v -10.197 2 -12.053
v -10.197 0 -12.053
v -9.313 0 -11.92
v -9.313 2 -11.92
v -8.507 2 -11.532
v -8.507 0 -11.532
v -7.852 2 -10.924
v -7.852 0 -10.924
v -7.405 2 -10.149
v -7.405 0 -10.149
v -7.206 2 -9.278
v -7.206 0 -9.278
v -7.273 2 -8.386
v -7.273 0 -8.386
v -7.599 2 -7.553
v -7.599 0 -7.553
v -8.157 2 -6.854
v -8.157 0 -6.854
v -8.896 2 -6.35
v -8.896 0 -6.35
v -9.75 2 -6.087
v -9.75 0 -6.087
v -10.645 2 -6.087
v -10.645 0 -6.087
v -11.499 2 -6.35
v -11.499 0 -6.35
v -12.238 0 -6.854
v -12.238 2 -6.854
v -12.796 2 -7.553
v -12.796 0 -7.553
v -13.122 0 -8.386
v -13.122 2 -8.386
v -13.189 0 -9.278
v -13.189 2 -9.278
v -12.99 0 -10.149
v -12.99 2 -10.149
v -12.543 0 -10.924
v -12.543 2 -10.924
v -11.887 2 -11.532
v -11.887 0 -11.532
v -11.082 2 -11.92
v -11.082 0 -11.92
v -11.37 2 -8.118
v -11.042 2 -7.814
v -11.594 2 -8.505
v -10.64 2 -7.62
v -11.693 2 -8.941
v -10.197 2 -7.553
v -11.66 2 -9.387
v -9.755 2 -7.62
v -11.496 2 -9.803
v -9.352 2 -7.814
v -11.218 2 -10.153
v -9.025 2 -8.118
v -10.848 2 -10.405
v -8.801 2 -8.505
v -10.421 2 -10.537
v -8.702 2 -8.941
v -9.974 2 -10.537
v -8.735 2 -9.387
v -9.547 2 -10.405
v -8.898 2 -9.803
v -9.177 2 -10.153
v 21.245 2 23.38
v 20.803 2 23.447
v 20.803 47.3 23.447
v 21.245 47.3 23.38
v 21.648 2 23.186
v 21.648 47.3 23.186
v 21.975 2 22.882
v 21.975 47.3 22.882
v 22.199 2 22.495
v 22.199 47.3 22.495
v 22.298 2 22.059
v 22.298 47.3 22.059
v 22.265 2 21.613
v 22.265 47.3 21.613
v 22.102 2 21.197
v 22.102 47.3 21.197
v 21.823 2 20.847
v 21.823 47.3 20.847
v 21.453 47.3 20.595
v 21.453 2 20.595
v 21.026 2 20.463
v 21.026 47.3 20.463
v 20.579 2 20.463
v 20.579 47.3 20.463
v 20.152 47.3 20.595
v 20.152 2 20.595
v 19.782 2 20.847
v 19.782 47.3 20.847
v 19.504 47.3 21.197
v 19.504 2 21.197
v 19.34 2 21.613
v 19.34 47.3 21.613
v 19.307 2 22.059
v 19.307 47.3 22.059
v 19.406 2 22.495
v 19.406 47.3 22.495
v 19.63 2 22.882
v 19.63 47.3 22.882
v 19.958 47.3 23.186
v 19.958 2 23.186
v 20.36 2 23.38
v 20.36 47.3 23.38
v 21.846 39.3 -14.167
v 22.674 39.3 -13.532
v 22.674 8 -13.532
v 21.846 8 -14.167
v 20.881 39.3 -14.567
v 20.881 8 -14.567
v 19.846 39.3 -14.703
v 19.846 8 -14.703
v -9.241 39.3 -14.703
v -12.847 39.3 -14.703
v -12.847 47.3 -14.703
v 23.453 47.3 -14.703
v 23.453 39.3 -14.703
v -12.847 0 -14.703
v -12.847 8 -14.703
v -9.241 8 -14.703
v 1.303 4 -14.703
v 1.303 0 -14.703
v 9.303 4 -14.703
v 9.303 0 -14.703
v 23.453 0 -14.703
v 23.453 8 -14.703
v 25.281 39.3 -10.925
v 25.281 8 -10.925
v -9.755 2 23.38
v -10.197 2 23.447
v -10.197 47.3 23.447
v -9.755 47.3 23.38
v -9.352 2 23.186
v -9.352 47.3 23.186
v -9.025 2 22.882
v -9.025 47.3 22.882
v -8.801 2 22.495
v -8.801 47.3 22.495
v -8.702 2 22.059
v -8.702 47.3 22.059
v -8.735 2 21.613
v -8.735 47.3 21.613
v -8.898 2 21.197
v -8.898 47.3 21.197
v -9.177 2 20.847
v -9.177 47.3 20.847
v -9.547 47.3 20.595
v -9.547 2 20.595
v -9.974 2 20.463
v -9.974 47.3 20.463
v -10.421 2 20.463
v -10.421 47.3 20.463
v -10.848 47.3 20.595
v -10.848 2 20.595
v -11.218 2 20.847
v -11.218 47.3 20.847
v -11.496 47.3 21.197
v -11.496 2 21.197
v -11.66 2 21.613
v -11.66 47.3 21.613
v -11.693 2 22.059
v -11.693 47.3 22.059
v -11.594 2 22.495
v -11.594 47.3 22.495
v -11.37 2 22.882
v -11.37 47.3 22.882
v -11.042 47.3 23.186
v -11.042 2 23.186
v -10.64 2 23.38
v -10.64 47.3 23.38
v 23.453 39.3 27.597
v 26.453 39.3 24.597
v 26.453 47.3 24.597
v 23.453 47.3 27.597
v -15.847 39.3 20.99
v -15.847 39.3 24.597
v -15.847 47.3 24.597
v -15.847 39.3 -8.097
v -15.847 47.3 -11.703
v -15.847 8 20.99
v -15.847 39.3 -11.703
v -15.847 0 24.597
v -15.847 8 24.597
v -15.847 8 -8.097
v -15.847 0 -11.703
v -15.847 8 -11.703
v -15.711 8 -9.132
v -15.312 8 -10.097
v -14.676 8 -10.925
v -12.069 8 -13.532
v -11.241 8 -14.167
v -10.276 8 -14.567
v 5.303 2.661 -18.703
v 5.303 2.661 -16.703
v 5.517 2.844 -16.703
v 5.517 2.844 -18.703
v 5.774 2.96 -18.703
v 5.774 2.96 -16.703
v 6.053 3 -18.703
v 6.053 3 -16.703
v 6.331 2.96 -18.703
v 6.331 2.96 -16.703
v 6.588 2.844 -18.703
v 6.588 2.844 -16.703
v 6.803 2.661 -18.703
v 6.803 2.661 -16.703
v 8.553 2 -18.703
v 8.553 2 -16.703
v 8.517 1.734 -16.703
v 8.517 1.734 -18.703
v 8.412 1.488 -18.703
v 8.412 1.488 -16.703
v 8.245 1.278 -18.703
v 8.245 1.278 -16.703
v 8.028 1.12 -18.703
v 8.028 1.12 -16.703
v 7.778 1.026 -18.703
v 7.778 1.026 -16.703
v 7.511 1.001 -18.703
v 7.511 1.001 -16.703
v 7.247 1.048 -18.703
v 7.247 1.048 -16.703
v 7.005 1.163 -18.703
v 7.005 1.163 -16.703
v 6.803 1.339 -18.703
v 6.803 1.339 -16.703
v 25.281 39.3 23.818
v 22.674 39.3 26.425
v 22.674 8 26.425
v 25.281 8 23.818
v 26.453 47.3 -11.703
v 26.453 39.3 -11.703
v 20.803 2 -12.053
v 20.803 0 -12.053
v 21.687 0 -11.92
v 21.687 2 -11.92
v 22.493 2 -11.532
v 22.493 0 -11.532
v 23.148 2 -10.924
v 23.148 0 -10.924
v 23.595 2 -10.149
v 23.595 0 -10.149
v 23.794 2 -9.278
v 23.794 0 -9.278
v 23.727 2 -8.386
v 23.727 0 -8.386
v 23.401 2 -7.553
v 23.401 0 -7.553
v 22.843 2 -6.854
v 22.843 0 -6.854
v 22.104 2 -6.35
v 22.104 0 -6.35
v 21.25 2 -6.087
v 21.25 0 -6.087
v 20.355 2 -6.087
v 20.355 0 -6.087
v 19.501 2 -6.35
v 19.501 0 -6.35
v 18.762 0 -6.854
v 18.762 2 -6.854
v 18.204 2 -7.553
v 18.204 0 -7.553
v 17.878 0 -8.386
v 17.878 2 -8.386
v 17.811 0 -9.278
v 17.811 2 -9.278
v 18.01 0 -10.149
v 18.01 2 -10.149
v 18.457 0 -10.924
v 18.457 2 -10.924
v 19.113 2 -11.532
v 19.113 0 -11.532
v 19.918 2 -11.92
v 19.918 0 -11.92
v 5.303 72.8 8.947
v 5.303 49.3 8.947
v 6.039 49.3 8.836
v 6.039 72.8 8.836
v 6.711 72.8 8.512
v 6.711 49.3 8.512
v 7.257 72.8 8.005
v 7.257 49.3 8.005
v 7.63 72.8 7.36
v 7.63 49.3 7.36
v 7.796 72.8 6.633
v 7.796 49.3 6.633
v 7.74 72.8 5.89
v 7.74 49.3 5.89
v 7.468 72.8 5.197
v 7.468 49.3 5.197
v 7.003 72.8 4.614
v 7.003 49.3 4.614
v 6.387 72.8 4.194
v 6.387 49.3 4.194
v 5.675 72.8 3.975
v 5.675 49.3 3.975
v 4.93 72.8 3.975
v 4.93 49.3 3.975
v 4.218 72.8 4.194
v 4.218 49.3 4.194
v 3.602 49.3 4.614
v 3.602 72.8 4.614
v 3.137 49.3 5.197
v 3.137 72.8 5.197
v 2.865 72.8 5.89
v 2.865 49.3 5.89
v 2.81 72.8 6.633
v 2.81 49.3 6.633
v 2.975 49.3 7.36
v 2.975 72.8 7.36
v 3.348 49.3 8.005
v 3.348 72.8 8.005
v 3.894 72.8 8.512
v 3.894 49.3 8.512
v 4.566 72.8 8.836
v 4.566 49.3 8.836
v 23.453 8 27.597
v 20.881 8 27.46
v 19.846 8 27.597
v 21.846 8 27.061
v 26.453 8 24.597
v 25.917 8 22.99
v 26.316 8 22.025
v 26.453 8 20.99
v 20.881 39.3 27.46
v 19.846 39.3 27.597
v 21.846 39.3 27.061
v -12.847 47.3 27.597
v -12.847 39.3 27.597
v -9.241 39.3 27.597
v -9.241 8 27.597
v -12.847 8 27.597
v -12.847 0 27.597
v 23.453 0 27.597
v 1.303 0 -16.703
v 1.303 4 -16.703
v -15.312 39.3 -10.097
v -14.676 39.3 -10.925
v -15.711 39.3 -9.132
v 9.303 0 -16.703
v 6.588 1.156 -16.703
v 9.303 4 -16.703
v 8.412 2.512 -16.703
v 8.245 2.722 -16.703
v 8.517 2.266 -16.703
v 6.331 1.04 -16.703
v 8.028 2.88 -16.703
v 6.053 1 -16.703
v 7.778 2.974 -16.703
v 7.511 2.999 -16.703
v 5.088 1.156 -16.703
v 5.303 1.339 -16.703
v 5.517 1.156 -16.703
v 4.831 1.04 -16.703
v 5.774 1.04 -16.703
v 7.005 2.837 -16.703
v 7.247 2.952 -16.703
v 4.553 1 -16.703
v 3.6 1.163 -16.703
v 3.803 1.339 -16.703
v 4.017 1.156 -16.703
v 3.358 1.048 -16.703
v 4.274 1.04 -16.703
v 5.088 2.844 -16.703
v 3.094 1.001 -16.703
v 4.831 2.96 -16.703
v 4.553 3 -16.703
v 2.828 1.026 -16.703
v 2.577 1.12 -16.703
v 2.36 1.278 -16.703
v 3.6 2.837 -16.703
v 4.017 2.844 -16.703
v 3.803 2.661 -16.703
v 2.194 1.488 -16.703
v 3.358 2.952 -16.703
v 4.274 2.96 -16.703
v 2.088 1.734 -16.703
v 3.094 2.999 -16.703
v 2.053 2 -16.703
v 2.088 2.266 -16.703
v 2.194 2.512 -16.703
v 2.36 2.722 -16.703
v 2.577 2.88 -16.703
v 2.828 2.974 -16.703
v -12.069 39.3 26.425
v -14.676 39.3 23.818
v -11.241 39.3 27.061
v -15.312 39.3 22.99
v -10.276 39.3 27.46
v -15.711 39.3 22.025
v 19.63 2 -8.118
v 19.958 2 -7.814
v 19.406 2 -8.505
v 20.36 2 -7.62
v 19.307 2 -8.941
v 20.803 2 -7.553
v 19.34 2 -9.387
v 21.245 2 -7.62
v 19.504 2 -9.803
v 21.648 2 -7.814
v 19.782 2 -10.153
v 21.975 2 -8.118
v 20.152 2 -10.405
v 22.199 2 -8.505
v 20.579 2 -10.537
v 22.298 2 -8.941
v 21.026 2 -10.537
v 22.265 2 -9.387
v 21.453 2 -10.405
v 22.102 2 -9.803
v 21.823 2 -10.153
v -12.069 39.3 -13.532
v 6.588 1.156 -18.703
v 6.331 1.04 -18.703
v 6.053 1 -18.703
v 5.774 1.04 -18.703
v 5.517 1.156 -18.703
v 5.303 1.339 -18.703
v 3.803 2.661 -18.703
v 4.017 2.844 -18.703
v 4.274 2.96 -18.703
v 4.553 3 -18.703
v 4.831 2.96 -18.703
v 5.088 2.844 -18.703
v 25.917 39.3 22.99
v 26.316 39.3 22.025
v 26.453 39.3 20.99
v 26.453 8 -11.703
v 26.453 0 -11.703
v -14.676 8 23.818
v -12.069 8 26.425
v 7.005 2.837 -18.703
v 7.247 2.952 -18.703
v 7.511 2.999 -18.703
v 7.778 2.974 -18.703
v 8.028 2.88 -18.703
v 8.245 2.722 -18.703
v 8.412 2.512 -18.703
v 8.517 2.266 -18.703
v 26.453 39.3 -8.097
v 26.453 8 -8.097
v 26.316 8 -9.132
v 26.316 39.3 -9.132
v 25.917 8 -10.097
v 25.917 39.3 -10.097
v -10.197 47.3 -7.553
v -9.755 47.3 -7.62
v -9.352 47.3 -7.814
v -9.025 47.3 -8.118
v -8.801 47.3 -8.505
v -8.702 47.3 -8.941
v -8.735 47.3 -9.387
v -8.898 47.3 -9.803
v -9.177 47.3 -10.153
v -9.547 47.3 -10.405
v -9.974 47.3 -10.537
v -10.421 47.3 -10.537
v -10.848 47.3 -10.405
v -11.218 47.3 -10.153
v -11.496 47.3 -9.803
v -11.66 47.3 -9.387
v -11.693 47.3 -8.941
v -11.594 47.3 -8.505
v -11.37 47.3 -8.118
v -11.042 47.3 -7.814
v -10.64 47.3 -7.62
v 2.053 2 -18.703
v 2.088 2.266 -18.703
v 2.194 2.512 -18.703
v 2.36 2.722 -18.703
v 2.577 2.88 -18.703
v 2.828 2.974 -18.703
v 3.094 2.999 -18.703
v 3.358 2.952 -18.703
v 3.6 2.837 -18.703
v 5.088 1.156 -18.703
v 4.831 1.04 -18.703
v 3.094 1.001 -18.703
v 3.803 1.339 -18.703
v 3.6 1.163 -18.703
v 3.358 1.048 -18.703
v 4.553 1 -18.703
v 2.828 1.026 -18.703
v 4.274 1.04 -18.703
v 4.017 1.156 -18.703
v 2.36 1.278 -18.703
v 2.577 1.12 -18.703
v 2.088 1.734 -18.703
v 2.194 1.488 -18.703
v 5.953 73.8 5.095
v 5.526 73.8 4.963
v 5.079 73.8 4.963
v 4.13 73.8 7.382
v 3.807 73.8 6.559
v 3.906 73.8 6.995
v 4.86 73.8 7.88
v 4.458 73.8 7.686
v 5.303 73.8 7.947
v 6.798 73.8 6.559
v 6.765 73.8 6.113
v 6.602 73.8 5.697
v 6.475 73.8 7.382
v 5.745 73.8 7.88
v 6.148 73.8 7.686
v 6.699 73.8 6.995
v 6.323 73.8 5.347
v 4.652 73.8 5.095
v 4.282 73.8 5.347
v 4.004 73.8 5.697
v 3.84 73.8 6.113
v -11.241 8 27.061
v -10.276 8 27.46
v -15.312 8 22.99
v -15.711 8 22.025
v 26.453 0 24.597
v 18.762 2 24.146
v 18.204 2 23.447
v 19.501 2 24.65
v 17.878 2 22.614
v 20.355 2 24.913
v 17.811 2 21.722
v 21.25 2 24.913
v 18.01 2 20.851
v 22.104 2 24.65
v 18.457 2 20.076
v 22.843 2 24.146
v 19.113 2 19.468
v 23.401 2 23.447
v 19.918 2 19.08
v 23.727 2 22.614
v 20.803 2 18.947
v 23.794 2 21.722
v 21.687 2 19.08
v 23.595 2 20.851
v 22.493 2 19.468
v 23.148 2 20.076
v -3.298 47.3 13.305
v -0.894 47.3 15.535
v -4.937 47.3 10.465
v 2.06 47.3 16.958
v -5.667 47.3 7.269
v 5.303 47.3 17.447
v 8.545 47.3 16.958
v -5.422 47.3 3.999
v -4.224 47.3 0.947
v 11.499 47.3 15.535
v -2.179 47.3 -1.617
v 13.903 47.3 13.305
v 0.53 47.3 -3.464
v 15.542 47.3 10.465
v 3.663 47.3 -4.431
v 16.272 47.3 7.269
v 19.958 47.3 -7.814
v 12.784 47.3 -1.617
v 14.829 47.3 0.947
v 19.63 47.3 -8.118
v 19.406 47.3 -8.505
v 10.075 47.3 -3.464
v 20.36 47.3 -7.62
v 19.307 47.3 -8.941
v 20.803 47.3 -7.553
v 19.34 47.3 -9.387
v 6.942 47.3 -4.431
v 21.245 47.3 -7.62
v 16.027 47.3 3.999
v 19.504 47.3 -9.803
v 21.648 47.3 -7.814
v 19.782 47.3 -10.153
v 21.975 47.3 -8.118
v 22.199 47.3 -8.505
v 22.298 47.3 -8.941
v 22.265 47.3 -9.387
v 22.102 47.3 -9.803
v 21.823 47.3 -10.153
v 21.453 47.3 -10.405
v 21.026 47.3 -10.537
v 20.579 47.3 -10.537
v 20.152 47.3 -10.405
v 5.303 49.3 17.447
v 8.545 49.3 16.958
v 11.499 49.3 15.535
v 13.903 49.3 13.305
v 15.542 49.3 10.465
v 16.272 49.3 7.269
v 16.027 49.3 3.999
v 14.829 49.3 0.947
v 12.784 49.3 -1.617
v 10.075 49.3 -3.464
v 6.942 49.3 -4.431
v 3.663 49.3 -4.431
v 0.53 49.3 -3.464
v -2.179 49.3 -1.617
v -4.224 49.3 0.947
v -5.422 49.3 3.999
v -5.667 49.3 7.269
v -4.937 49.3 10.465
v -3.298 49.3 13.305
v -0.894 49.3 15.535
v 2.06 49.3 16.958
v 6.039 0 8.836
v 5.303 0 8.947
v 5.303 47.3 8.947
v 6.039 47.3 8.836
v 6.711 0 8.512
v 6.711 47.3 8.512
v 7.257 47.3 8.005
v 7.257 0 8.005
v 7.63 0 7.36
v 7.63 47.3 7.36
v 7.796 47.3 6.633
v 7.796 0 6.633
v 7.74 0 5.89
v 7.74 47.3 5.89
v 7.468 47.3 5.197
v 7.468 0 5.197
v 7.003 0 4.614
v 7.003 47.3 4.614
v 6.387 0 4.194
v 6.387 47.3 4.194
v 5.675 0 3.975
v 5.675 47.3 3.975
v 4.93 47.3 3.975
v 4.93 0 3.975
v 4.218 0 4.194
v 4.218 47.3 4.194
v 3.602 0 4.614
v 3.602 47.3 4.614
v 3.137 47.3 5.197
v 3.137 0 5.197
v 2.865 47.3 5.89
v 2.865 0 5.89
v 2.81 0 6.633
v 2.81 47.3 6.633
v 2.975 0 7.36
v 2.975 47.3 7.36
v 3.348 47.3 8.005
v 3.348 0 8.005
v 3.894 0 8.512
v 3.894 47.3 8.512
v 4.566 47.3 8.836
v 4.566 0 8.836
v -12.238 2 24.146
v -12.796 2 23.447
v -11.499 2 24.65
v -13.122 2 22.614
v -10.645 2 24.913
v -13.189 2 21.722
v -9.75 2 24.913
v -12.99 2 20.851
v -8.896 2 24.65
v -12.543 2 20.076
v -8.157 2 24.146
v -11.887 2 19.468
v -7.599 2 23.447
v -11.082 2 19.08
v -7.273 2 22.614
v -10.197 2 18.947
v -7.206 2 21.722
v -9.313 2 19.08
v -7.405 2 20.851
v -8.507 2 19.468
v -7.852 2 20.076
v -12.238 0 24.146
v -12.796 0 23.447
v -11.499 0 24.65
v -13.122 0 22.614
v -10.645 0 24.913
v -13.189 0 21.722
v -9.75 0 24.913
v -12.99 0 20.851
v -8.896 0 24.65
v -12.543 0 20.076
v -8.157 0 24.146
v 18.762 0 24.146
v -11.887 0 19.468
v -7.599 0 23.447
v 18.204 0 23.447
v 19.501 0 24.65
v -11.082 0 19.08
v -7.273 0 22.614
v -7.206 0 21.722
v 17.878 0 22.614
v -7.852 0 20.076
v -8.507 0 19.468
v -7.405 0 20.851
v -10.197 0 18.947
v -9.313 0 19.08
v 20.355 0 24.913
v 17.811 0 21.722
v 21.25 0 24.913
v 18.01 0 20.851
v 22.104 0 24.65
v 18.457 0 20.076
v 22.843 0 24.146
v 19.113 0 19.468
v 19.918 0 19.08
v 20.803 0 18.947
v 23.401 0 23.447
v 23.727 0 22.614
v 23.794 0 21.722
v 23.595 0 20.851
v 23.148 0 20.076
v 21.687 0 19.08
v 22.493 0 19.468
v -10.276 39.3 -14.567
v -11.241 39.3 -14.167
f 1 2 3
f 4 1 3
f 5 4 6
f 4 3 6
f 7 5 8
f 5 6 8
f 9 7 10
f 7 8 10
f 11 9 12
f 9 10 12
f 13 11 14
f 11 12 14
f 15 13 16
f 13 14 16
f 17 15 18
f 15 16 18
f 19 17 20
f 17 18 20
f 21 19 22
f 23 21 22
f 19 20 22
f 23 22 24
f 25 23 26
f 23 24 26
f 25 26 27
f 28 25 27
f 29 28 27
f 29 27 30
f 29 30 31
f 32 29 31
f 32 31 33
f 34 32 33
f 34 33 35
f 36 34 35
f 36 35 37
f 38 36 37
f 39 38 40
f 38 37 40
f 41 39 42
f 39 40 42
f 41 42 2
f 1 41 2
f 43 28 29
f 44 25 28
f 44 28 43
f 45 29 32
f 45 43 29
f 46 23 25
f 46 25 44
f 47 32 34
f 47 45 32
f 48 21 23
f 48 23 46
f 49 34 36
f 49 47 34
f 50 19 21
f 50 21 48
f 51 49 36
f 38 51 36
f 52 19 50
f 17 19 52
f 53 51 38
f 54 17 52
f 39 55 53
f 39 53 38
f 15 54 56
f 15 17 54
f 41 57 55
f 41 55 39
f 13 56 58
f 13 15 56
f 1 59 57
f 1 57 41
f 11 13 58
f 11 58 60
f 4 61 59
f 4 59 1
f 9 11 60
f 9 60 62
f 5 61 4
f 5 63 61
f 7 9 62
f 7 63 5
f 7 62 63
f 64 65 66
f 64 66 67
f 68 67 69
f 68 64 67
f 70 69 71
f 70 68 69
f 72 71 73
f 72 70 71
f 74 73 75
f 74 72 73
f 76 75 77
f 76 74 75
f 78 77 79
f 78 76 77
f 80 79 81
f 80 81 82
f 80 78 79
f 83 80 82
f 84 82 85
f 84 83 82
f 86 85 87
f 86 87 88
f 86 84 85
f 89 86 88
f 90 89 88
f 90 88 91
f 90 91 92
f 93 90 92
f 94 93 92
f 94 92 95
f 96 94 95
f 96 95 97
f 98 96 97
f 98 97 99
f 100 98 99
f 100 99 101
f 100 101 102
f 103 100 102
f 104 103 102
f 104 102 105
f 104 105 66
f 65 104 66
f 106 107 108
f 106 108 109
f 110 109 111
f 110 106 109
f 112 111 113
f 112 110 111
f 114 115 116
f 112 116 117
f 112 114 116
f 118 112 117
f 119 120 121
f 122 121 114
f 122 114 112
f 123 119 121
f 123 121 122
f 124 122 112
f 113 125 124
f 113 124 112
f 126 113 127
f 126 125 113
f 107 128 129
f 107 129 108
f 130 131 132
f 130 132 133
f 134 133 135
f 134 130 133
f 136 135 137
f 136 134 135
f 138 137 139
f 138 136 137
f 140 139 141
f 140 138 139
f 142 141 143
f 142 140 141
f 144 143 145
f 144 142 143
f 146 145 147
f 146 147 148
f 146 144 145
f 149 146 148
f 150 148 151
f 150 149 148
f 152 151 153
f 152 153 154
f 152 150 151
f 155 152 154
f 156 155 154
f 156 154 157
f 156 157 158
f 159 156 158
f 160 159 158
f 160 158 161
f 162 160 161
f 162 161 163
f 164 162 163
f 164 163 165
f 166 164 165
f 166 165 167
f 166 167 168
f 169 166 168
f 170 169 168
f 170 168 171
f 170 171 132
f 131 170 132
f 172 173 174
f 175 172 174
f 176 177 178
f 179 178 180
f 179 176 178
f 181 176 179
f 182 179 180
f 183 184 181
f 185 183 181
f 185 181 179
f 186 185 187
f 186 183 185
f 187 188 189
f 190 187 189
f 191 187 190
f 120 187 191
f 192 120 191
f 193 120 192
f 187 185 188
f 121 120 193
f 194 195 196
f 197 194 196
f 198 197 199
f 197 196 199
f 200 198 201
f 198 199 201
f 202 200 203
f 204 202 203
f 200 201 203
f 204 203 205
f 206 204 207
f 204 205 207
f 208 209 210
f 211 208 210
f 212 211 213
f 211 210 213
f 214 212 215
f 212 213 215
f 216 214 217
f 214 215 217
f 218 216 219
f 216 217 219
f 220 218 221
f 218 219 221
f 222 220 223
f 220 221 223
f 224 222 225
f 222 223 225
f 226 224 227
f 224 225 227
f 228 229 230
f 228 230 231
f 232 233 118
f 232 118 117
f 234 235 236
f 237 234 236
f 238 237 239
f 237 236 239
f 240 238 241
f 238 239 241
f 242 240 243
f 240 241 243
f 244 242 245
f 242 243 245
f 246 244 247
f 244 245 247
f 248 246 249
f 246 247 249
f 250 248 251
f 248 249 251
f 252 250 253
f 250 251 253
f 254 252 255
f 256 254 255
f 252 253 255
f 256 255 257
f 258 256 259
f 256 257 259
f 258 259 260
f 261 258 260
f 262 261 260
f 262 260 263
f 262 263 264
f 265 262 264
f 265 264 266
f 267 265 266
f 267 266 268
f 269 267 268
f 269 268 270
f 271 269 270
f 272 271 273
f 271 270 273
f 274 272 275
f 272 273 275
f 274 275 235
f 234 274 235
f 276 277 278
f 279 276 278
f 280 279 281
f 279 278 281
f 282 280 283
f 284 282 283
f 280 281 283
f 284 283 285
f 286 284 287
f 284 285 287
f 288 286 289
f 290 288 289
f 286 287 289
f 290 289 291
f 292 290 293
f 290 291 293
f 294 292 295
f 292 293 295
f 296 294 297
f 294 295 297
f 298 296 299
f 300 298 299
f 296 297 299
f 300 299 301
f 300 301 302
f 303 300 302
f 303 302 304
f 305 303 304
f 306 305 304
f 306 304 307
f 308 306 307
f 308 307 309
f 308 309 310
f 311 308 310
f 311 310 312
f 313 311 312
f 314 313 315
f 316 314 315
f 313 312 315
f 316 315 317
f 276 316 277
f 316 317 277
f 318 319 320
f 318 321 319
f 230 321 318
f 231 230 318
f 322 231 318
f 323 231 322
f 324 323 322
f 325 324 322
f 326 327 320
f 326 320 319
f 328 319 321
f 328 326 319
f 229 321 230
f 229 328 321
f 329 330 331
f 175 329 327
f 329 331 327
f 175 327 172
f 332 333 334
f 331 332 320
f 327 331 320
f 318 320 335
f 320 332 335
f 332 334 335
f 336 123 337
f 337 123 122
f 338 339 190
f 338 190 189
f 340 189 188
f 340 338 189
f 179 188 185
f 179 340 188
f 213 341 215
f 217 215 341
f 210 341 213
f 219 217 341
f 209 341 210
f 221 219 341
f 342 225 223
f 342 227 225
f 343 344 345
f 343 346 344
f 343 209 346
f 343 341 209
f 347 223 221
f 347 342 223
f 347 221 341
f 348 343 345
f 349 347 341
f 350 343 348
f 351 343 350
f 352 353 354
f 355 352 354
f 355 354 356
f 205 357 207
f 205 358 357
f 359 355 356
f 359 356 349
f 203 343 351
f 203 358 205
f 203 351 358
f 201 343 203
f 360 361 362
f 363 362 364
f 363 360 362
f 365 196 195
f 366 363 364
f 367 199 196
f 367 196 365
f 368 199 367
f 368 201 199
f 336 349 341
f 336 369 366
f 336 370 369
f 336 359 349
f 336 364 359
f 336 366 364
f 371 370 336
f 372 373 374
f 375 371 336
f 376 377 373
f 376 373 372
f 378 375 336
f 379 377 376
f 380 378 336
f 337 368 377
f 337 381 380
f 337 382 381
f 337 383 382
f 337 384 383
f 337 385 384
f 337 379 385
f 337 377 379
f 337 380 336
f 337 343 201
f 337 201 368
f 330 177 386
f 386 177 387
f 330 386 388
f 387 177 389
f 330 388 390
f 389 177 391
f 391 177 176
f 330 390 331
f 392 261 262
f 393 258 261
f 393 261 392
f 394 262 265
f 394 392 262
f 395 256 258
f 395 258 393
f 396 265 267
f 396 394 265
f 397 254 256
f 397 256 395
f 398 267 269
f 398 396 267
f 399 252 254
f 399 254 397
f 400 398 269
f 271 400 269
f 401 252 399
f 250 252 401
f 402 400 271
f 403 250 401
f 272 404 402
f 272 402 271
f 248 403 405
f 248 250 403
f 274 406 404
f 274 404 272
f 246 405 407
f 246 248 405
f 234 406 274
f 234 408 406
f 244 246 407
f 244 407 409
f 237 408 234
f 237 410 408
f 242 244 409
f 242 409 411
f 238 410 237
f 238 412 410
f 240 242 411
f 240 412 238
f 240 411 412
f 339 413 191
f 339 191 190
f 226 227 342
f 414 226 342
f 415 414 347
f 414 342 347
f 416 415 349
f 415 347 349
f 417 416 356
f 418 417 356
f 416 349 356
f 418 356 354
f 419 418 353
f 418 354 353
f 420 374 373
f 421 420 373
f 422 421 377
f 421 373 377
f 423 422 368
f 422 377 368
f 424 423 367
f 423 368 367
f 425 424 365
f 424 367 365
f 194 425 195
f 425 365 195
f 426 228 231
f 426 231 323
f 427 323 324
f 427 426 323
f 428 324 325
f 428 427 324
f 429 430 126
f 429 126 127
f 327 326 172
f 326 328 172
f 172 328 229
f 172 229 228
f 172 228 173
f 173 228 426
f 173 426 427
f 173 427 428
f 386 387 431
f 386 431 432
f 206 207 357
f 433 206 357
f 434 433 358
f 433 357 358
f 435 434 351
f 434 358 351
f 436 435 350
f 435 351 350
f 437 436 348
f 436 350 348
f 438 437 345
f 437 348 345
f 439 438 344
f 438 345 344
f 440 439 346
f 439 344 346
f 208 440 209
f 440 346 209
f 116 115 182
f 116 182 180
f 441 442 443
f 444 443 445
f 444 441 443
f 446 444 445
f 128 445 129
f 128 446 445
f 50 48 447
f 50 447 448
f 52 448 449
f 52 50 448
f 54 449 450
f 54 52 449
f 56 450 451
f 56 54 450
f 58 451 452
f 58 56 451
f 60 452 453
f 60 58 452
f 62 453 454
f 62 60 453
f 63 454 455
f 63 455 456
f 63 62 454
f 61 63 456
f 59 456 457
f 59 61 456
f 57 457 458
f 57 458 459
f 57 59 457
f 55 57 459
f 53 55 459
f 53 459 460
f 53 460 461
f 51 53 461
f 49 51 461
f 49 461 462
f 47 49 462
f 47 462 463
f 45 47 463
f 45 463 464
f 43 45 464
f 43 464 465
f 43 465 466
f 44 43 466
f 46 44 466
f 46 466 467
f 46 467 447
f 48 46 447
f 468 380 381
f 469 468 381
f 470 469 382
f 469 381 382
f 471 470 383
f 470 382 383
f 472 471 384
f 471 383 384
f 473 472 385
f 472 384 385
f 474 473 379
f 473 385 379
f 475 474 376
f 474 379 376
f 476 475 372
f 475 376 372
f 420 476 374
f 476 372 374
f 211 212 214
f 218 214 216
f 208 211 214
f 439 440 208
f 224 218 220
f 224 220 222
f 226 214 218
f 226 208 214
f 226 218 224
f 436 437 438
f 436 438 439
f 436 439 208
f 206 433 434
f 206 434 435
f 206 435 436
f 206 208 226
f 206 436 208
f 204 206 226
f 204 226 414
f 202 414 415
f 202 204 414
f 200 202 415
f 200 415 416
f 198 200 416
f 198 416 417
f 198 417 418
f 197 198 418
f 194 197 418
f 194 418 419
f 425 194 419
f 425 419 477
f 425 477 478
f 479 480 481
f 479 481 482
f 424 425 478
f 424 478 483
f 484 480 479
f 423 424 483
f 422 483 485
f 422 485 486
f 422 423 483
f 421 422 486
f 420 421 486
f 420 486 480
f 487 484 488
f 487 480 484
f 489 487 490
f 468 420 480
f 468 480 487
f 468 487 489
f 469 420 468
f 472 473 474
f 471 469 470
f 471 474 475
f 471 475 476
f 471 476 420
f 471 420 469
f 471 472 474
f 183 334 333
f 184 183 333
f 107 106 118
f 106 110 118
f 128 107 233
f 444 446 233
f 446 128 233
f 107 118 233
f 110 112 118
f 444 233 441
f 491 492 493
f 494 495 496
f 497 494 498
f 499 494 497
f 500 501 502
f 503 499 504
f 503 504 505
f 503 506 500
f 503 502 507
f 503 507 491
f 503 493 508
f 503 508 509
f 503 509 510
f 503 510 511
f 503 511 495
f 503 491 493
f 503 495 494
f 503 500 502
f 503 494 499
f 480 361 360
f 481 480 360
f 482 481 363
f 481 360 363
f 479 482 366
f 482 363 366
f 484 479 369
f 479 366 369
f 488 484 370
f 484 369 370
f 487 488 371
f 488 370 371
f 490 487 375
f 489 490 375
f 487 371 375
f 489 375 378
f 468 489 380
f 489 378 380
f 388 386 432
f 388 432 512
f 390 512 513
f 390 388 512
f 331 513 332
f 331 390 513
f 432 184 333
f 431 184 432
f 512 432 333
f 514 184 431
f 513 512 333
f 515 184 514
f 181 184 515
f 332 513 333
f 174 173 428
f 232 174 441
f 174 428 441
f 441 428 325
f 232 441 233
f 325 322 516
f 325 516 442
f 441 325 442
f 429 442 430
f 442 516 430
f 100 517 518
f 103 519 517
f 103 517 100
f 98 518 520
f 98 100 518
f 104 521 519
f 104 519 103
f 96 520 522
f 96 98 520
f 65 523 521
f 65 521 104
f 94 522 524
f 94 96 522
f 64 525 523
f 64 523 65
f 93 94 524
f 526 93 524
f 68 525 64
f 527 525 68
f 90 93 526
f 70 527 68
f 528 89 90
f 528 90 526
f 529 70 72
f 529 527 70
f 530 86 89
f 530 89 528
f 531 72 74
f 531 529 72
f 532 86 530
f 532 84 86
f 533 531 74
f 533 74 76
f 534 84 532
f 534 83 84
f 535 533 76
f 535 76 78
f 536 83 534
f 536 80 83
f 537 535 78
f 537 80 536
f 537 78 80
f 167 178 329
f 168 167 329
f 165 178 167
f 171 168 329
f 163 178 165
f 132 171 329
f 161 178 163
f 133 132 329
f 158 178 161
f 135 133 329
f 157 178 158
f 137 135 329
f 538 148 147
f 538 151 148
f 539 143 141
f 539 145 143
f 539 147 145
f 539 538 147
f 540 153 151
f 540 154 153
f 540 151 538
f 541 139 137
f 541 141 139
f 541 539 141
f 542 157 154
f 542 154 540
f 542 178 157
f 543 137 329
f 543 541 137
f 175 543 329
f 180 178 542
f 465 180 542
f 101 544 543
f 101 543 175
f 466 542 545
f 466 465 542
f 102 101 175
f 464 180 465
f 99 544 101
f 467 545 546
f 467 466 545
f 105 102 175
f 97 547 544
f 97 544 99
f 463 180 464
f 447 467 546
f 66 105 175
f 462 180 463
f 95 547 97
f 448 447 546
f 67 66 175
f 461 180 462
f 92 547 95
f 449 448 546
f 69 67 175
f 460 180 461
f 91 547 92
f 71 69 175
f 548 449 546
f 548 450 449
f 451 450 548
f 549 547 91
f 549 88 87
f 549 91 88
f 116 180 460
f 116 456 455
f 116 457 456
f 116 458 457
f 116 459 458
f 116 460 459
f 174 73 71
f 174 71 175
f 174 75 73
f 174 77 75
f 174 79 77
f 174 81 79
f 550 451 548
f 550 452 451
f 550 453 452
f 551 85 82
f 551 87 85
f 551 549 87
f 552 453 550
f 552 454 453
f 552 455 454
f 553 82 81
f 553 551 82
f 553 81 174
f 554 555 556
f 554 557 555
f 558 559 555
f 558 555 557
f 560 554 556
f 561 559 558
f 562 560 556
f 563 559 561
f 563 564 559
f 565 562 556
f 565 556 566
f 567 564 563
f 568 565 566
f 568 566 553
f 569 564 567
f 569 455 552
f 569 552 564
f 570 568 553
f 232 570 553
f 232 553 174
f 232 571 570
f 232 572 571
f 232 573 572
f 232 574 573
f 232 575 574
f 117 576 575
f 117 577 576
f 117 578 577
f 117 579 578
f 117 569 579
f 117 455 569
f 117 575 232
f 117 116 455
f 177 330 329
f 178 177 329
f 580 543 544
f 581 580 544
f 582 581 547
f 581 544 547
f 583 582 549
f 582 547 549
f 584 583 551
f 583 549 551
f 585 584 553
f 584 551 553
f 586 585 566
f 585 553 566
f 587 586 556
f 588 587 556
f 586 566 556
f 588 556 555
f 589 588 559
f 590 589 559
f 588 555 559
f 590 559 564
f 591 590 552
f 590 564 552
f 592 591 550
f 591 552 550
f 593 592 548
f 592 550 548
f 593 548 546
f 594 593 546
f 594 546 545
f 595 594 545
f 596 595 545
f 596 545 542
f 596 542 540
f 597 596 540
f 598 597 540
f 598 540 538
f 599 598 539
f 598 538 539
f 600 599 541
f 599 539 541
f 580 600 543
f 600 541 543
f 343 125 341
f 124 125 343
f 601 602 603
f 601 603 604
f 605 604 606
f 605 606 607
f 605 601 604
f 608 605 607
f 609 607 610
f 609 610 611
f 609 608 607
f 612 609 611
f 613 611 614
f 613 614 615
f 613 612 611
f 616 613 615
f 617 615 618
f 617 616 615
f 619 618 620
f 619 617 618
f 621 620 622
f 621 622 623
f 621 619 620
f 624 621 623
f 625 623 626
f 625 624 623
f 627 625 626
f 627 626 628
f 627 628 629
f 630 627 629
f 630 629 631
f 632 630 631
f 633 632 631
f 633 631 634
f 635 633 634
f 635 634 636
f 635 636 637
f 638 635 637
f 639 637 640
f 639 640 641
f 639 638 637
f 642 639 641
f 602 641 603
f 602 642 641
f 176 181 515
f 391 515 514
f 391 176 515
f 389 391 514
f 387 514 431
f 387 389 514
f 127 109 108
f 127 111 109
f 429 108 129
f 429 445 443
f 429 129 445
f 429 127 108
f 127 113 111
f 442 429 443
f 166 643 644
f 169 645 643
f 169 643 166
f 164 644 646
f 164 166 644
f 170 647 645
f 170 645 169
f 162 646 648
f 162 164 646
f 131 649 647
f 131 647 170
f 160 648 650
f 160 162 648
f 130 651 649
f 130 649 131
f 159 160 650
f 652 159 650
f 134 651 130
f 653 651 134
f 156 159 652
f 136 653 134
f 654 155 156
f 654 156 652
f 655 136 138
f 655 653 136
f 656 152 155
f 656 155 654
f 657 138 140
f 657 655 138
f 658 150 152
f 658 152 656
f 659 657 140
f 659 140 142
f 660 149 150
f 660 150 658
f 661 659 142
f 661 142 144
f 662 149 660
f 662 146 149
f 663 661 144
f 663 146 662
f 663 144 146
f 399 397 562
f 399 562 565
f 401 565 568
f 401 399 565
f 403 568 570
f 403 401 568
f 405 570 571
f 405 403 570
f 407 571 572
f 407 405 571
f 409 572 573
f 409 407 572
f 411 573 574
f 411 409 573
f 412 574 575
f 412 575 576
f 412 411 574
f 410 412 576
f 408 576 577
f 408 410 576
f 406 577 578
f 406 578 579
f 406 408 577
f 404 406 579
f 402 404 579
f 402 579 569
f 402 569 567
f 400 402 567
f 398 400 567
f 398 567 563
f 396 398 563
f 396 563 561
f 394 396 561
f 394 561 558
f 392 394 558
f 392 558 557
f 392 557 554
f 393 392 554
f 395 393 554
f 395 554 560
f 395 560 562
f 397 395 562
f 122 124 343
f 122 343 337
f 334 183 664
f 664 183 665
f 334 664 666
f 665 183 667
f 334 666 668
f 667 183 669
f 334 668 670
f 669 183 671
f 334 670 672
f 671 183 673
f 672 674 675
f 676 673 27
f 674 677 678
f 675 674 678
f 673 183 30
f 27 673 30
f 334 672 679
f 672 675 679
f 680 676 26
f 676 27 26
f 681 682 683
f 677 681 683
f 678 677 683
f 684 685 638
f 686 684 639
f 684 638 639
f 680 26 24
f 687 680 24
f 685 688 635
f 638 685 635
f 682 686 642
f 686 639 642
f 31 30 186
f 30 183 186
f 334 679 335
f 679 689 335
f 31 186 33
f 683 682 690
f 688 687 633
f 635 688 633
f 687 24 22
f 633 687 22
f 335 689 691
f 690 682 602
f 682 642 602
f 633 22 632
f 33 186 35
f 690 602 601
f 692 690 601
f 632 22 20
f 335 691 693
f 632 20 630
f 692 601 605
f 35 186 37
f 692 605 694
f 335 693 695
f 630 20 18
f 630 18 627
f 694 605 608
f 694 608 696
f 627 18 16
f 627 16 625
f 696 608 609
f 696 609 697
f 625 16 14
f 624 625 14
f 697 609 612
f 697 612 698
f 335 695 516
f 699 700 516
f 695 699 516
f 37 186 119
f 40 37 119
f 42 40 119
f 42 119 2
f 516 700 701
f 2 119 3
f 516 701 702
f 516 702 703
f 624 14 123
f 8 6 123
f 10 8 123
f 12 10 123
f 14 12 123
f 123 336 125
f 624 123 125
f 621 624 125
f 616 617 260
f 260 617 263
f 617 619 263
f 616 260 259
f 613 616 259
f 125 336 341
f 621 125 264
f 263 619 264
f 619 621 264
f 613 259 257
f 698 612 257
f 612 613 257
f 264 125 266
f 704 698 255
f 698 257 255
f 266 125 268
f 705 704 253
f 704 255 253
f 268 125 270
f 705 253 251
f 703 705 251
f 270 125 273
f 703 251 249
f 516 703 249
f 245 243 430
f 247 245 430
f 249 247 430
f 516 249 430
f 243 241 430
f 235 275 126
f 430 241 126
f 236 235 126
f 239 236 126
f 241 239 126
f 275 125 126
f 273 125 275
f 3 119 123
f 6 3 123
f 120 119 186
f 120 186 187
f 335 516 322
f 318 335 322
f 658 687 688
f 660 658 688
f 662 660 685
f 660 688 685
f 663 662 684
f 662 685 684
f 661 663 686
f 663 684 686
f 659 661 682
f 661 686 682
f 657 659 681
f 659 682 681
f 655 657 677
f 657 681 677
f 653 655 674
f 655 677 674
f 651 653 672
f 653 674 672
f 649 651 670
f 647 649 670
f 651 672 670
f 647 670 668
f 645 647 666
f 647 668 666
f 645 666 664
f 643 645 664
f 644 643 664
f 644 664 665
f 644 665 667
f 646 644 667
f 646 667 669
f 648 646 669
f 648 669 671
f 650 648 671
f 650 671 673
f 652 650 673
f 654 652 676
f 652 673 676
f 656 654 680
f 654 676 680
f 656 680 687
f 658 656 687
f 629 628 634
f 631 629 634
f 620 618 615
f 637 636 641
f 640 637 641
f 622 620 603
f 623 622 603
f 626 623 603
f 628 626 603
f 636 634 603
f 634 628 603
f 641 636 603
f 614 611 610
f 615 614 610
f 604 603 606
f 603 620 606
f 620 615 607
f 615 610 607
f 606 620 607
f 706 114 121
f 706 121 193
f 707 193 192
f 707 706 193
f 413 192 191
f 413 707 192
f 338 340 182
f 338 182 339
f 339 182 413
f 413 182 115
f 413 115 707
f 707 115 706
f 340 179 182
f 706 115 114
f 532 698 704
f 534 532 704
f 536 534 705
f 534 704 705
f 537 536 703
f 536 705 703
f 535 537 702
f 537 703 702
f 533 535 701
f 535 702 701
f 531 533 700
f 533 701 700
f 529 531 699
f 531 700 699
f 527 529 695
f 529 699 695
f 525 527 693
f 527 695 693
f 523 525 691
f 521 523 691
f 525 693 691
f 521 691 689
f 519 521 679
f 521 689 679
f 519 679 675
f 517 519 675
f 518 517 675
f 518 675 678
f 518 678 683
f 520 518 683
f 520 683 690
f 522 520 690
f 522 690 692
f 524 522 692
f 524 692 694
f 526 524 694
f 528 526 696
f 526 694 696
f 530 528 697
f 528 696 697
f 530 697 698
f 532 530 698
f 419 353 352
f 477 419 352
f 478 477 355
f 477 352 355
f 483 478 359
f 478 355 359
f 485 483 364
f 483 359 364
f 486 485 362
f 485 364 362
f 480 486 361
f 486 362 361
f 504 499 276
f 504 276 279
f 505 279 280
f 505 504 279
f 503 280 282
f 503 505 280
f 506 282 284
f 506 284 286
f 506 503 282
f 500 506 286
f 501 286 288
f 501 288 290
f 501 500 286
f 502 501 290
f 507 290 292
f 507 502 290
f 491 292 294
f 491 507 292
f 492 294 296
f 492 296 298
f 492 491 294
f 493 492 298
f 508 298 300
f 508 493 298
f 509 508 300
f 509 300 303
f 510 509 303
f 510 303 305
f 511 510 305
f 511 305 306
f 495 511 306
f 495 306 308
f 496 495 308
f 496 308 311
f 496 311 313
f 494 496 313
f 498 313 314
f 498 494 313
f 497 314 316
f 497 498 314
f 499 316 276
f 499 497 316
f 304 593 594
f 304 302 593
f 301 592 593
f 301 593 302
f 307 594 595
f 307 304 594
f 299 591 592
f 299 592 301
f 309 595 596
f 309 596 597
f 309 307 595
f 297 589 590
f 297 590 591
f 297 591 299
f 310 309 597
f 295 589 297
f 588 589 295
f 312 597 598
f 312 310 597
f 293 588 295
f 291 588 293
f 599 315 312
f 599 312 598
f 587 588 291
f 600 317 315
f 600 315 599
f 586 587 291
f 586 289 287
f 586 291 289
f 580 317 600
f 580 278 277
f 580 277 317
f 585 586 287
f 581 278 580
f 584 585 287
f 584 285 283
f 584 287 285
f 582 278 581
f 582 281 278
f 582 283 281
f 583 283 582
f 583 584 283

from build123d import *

# Parameters (mm, degrees)
ESQUISSE1_W             = 42.3
ESQUISSE1_H             = 42.3
ESQUISSE1_R             = 2.5
ESQUISSE1_R_2           = 1.5
BOSS_EXTRU_1_DEPTH      = 47.3
ESQUISSE2_R             = 11
BOSS_EXTRU_2_DEPTH      = 2
ESQUISSE3_R             = 2.5
BOSS_EXTRU_3_DEPTH      = 24.5
CHANFREIN1_SIZE         = 1
ENL_V_START             = -8
ESQUISSE4_OUTSIDE_W     = 63.3
ESQUISSE4_OUTSIDE_H     = 63.3
ENL_V_MAT_EXTRU_1_DEPTH = 31.3
CHANFREIN2_SIZE         = 3
ESQUISSE5_R             = 3
ENL_V_MAT_EXTRU_2_DEPTH = 2
ESQUISSE6_W             = 8
ESQUISSE6_H             = 4
BOSS_EXTRU_4_DEPTH      = 2
BOSS_EXTRU_6_DEPTH      = 2


with BuildPart() as part:
    # Esquisse1 → Boss.-Extru.1 (new body)
    with BuildSketch(Plane(origin=(0, 0, 0), x_dir=(1, 0, 0), z_dir=(0, 1, 0))):
        with Locations((5.302542373, -6.446610169)):
            Rectangle(ESQUISSE1_W, ESQUISSE1_H)
        with Locations(Location((5.302542373, -6.446610169, 0), (0, 0, 270))):
            Circle(ESQUISSE1_R, mode=Mode.SUBTRACT)
        with Locations(Location((-10.197457627, 9.053389831, 0), (0, 0, 270))):
            Circle(ESQUISSE1_R_2, mode=Mode.SUBTRACT)
        with Locations(Location((20.802542373, 9.053389831, 0), (0, 0, 270))):
            Circle(ESQUISSE1_R_2, mode=Mode.SUBTRACT)
        with Locations(Location((20.802542373, -21.946610169, 0), (0, 0, 270))):
            Circle(ESQUISSE1_R_2, mode=Mode.SUBTRACT)
        with Locations(Location((-10.197457627, -21.946610169, 0), (0, 0, 270))):
            Circle(ESQUISSE1_R_2, mode=Mode.SUBTRACT)
    extrude(amount=BOSS_EXTRU_1_DEPTH)

    # Esquisse2 → Boss.-Extru.2 (add)
    with BuildSketch(Plane(origin=(0, 47.3, 0), x_dir=(1, 0, 0), z_dir=(0, 1, 0))):
        with Locations(Location((5.302542373, -6.446610169, 0), (0, 0, 270))):
            Circle(ESQUISSE2_R)
    extrude(amount=BOSS_EXTRU_2_DEPTH)

    # Esquisse3 → Boss.-Extru.3 (add)
    with BuildSketch(Plane(origin=(0, 49.3, 0), x_dir=(1, 0, 0), z_dir=(0, 1, 0))):
        with Locations(Location((5.302542373, -6.446610169, 0), (0, 0, 270))):
            Circle(ESQUISSE3_R)
    extrude(amount=BOSS_EXTRU_3_DEPTH)

    # Chanfrein1
    chanfrein1_edges = [part.edges().sort_by_distance(p)[0] for p in [
        (5.302542373, 73.8, 3.946610169),
    ]]
    chamfer(chanfrein1_edges, length=CHANFREIN1_SIZE)

    # Esquisse4 outside → Enlèv. mat.-Extru.1 (cut)
    with BuildSketch(Plane(origin=(0, 47.3, 0), x_dir=(1, 0, 0), z_dir=(0, 1, 0)).offset(ENL_V_START)):
        with Locations((5.303, -6.447)):
            Rectangle(ESQUISSE4_OUTSIDE_W, ESQUISSE4_OUTSIDE_H)
        with BuildLine():
            Line((-14.675884752, -23.818435576), (-12.069283034, -26.425037294))
            ThreePointArc((-12.069283034, -26.425037294), (-10.771589639, -27.2921283), (-9.240855909, -27.596610169))
            Line((-9.240855909, -27.596610169), (19.845940655, -27.596610169))
            ThreePointArc((19.845940655, -27.596610169), (21.376674385, -27.2921283), (22.67436778, -26.425037294))
            Line((22.67436778, -26.425037294), (25.280969498, -23.818435576))
            ThreePointArc((25.280969498, -23.818435576), (26.148060503, -22.520742181), (26.452542373, -20.990008452))
            Line((26.452542373, -20.990008452), (26.452542373, 8.096788113))
            ThreePointArc((26.452542373, 8.096788113), (26.148060503, 9.627521842), (25.280969498, 10.925215237))
            Line((25.280969498, 10.925215237), (22.67436778, 13.531816955))
            ThreePointArc((22.67436778, 13.531816955), (21.376674385, 14.398907961), (19.845940655, 14.703389831))
            Line((19.845940655, 14.703389831), (-9.240855909, 14.703389831))
            ThreePointArc((-9.240855909, 14.703389831), (-10.771589639, 14.398907961), (-12.069283034, 13.531816955))
            Line((-12.069283034, 13.531816955), (-14.675884752, 10.925215237))
            ThreePointArc((-14.675884752, 10.925215237), (-15.542975757, 9.627521842), (-15.847457627, 8.096788113))
            Line((-15.847457627, 8.096788113), (-15.847457627, -20.990008452))
            ThreePointArc((-15.847457627, -20.990008452), (-15.542975757, -22.520742181), (-14.675884752, -23.818435576))
        make_face(mode=Mode.SUBTRACT)
    extrude(amount=-ENL_V_MAT_EXTRU_1_DEPTH, mode=Mode.SUBTRACT)

    # Chanfrein2
    chanfrein2_edges = [part.edges().sort_by_distance(p)[0] for p in [
        (-15.847457627, 4, -14.703389831),
        (26.452542373, 4, -14.703389831),
        (26.452542373, 4, 27.596610169),
        (-15.847457627, 4, 27.596610169),
        (-15.847457627, 43.3, -14.703389831),
        (26.452542373, 43.3, -14.703389831),
        (26.452542373, 43.3, 27.596610169),
        (-15.847457627, 43.3, 27.596610169),
    ]]
    chamfer(chanfrein2_edges, length=CHANFREIN2_SIZE)

    # Esquisse5 → Enlèv. mat.-Extru.2 (cut)
    with BuildSketch(Plane.XZ):
        with Locations(Location((-10.197457627, -9.053389831, 0), (0, 0, 270))):
            Circle(ESQUISSE5_R)
        with Locations(Location((-10.197457627, 21.946610169, 0), (0, 0, 270))):
            Circle(ESQUISSE5_R)
        with Locations(Location((20.802542373, 21.946610169, 0), (0, 0, 270))):
            Circle(ESQUISSE5_R)
        with Locations(Location((20.802542373, -9.053389831, 0), (0, 0, 270))):
            Circle(ESQUISSE5_R)
    extrude(amount=-ENL_V_MAT_EXTRU_2_DEPTH, mode=Mode.SUBTRACT)

    # Esquisse6 → Boss.-Extru.4 (add)
    with BuildSketch(Plane(origin=(0, 0, -14.703389831), x_dir=(-1, 0, 0), z_dir=(0, 0, -1))):
        with Locations((-5.302542373, 2)):
            Rectangle(ESQUISSE6_W, ESQUISSE6_H)
    extrude(amount=BOSS_EXTRU_4_DEPTH)

    # Esquisse7 → Boss.-Extru.6 (add)
    with BuildSketch(Plane(origin=(0, 0, -16.703389831), x_dir=(-1, 0, 0), z_dir=(0, 0, -1))):
        with BuildLine():
            ThreePointArc((-7.052542373, 2), (-6.98795672, 2.353553391), (-6.802542373, 2.661437828))
            ThreePointArc((-6.802542373, 2.661437828), (-7.906095763, 2.935414347), (-8.552542373, 2))
            Line((-8.552542373, 2), (-7.052542373, 2))
        make_face()
        with BuildLine():
            ThreePointArc((-6.552542373, 2), (-6.617128026, 2.353553391), (-6.802542373, 2.661437828))
            ThreePointArc((-6.802542373, 2.661437828), (-6.98795672, 2.353553391), (-7.052542373, 2))
            Line((-7.052542373, 2), (-6.552542373, 2))
        make_face()
        with BuildLine():
            ThreePointArc((-7.052542373, 2), (-6.98795672, 1.646446609), (-6.802542373, 1.338562172))
            ThreePointArc((-6.802542373, 1.338562172), (-6.617128026, 1.646446609), (-6.552542373, 2))
            Line((-6.552542373, 2), (-7.052542373, 2))
        make_face()
        with BuildLine():
            ThreePointArc((-8.552542373, 2), (-7.906095763, 1.064585653), (-6.802542373, 1.338562172))
            ThreePointArc((-6.802542373, 1.338562172), (-6.98795672, 1.646446609), (-7.052542373, 2))
            Line((-7.052542373, 2), (-8.552542373, 2))
        make_face()
        with BuildLine():
            ThreePointArc((-5.552542373, 2), (-5.48795672, 2.353553391), (-5.302542373, 2.661437828))
            ThreePointArc((-5.302542373, 2.661437828), (-6.052542373, 3), (-6.802542373, 2.661437828))
            ThreePointArc((-6.802542373, 2.661437828), (-6.617128026, 2.353553391), (-6.552542373, 2))
            Line((-6.552542373, 2), (-5.552542373, 2))
        make_face()
        with BuildLine():
            ThreePointArc((-6.802542373, 1.338562172), (-6.052542373, 1), (-5.302542373, 1.338562172))
            ThreePointArc((-5.302542373, 1.338562172), (-5.48795672, 1.646446609), (-5.552542373, 2))
            Line((-5.552542373, 2), (-6.552542373, 2))
            ThreePointArc((-6.552542373, 2), (-6.617128026, 1.646446609), (-6.802542373, 1.338562172))
        make_face()
        with BuildLine():
            ThreePointArc((-3.802542373, 1.338562172), (-3.98795672, 1.646446609), (-4.052542373, 2))
            Line((-4.052542373, 2), (-5.052542373, 2))
            ThreePointArc((-5.052542373, 2), (-5.117128026, 1.646446609), (-5.302542373, 1.338562172))
            ThreePointArc((-5.302542373, 1.338562172), (-4.552542373, 1), (-3.802542373, 1.338562172))
        make_face()
        with BuildLine():
            Line((-5.052542373, 2), (-4.052542373, 2))
            ThreePointArc((-4.052542373, 2), (-3.98795672, 2.353553391), (-3.802542373, 2.661437828))
            ThreePointArc((-3.802542373, 2.661437828), (-4.552542373, 3), (-5.302542373, 2.661437828))
            ThreePointArc((-5.302542373, 2.661437828), (-5.117128026, 2.353553391), (-5.052542373, 2))
        make_face()
        with BuildLine():
            ThreePointArc((-3.802542373, 2.661437828), (-3.617128026, 2.353553391), (-3.552542373, 2))
            Line((-3.552542373, 2), (-2.052542373, 2))
            ThreePointArc((-2.052542373, 2), (-2.698988982, 2.935414347), (-3.802542373, 2.661437828))
        make_face()
        with BuildLine():
            ThreePointArc((-3.802542373, 1.338562172), (-3.617128026, 1.646446609), (-3.552542373, 2))
            Line((-3.552542373, 2), (-4.052542373, 2))
            ThreePointArc((-4.052542373, 2), (-3.98795672, 1.646446609), (-3.802542373, 1.338562172))
        make_face()
        with BuildLine():
            Line((-4.052542373, 2), (-3.552542373, 2))
            ThreePointArc((-3.552542373, 2), (-3.617128026, 2.353553391), (-3.802542373, 2.661437828))
            ThreePointArc((-3.802542373, 2.661437828), (-3.98795672, 2.353553391), (-4.052542373, 2))
        make_face()
        with BuildLine():
            Line((-2.052542373, 2), (-3.552542373, 2))
            ThreePointArc((-3.552542373, 2), (-3.617128026, 1.646446609), (-3.802542373, 1.338562172))
            ThreePointArc((-3.802542373, 1.338562172), (-2.698988982, 1.064585653), (-2.052542373, 2))
        make_face()
        with BuildLine():
            ThreePointArc((-5.302542373, 1.338562172), (-5.117128026, 1.646446609), (-5.052542373, 2))
            Line((-5.052542373, 2), (-5.552542373, 2))
            ThreePointArc((-5.552542373, 2), (-5.48795672, 1.646446609), (-5.302542373, 1.338562172))
        make_face()
        with BuildLine():
            Line((-5.552542373, 2), (-5.052542373, 2))
            ThreePointArc((-5.052542373, 2), (-5.117128026, 2.353553391), (-5.302542373, 2.661437828))
            ThreePointArc((-5.302542373, 2.661437828), (-5.48795672, 2.353553391), (-5.552542373, 2))
        make_face()
    extrude(amount=BOSS_EXTRU_6_DEPTH)


solid = part.part
